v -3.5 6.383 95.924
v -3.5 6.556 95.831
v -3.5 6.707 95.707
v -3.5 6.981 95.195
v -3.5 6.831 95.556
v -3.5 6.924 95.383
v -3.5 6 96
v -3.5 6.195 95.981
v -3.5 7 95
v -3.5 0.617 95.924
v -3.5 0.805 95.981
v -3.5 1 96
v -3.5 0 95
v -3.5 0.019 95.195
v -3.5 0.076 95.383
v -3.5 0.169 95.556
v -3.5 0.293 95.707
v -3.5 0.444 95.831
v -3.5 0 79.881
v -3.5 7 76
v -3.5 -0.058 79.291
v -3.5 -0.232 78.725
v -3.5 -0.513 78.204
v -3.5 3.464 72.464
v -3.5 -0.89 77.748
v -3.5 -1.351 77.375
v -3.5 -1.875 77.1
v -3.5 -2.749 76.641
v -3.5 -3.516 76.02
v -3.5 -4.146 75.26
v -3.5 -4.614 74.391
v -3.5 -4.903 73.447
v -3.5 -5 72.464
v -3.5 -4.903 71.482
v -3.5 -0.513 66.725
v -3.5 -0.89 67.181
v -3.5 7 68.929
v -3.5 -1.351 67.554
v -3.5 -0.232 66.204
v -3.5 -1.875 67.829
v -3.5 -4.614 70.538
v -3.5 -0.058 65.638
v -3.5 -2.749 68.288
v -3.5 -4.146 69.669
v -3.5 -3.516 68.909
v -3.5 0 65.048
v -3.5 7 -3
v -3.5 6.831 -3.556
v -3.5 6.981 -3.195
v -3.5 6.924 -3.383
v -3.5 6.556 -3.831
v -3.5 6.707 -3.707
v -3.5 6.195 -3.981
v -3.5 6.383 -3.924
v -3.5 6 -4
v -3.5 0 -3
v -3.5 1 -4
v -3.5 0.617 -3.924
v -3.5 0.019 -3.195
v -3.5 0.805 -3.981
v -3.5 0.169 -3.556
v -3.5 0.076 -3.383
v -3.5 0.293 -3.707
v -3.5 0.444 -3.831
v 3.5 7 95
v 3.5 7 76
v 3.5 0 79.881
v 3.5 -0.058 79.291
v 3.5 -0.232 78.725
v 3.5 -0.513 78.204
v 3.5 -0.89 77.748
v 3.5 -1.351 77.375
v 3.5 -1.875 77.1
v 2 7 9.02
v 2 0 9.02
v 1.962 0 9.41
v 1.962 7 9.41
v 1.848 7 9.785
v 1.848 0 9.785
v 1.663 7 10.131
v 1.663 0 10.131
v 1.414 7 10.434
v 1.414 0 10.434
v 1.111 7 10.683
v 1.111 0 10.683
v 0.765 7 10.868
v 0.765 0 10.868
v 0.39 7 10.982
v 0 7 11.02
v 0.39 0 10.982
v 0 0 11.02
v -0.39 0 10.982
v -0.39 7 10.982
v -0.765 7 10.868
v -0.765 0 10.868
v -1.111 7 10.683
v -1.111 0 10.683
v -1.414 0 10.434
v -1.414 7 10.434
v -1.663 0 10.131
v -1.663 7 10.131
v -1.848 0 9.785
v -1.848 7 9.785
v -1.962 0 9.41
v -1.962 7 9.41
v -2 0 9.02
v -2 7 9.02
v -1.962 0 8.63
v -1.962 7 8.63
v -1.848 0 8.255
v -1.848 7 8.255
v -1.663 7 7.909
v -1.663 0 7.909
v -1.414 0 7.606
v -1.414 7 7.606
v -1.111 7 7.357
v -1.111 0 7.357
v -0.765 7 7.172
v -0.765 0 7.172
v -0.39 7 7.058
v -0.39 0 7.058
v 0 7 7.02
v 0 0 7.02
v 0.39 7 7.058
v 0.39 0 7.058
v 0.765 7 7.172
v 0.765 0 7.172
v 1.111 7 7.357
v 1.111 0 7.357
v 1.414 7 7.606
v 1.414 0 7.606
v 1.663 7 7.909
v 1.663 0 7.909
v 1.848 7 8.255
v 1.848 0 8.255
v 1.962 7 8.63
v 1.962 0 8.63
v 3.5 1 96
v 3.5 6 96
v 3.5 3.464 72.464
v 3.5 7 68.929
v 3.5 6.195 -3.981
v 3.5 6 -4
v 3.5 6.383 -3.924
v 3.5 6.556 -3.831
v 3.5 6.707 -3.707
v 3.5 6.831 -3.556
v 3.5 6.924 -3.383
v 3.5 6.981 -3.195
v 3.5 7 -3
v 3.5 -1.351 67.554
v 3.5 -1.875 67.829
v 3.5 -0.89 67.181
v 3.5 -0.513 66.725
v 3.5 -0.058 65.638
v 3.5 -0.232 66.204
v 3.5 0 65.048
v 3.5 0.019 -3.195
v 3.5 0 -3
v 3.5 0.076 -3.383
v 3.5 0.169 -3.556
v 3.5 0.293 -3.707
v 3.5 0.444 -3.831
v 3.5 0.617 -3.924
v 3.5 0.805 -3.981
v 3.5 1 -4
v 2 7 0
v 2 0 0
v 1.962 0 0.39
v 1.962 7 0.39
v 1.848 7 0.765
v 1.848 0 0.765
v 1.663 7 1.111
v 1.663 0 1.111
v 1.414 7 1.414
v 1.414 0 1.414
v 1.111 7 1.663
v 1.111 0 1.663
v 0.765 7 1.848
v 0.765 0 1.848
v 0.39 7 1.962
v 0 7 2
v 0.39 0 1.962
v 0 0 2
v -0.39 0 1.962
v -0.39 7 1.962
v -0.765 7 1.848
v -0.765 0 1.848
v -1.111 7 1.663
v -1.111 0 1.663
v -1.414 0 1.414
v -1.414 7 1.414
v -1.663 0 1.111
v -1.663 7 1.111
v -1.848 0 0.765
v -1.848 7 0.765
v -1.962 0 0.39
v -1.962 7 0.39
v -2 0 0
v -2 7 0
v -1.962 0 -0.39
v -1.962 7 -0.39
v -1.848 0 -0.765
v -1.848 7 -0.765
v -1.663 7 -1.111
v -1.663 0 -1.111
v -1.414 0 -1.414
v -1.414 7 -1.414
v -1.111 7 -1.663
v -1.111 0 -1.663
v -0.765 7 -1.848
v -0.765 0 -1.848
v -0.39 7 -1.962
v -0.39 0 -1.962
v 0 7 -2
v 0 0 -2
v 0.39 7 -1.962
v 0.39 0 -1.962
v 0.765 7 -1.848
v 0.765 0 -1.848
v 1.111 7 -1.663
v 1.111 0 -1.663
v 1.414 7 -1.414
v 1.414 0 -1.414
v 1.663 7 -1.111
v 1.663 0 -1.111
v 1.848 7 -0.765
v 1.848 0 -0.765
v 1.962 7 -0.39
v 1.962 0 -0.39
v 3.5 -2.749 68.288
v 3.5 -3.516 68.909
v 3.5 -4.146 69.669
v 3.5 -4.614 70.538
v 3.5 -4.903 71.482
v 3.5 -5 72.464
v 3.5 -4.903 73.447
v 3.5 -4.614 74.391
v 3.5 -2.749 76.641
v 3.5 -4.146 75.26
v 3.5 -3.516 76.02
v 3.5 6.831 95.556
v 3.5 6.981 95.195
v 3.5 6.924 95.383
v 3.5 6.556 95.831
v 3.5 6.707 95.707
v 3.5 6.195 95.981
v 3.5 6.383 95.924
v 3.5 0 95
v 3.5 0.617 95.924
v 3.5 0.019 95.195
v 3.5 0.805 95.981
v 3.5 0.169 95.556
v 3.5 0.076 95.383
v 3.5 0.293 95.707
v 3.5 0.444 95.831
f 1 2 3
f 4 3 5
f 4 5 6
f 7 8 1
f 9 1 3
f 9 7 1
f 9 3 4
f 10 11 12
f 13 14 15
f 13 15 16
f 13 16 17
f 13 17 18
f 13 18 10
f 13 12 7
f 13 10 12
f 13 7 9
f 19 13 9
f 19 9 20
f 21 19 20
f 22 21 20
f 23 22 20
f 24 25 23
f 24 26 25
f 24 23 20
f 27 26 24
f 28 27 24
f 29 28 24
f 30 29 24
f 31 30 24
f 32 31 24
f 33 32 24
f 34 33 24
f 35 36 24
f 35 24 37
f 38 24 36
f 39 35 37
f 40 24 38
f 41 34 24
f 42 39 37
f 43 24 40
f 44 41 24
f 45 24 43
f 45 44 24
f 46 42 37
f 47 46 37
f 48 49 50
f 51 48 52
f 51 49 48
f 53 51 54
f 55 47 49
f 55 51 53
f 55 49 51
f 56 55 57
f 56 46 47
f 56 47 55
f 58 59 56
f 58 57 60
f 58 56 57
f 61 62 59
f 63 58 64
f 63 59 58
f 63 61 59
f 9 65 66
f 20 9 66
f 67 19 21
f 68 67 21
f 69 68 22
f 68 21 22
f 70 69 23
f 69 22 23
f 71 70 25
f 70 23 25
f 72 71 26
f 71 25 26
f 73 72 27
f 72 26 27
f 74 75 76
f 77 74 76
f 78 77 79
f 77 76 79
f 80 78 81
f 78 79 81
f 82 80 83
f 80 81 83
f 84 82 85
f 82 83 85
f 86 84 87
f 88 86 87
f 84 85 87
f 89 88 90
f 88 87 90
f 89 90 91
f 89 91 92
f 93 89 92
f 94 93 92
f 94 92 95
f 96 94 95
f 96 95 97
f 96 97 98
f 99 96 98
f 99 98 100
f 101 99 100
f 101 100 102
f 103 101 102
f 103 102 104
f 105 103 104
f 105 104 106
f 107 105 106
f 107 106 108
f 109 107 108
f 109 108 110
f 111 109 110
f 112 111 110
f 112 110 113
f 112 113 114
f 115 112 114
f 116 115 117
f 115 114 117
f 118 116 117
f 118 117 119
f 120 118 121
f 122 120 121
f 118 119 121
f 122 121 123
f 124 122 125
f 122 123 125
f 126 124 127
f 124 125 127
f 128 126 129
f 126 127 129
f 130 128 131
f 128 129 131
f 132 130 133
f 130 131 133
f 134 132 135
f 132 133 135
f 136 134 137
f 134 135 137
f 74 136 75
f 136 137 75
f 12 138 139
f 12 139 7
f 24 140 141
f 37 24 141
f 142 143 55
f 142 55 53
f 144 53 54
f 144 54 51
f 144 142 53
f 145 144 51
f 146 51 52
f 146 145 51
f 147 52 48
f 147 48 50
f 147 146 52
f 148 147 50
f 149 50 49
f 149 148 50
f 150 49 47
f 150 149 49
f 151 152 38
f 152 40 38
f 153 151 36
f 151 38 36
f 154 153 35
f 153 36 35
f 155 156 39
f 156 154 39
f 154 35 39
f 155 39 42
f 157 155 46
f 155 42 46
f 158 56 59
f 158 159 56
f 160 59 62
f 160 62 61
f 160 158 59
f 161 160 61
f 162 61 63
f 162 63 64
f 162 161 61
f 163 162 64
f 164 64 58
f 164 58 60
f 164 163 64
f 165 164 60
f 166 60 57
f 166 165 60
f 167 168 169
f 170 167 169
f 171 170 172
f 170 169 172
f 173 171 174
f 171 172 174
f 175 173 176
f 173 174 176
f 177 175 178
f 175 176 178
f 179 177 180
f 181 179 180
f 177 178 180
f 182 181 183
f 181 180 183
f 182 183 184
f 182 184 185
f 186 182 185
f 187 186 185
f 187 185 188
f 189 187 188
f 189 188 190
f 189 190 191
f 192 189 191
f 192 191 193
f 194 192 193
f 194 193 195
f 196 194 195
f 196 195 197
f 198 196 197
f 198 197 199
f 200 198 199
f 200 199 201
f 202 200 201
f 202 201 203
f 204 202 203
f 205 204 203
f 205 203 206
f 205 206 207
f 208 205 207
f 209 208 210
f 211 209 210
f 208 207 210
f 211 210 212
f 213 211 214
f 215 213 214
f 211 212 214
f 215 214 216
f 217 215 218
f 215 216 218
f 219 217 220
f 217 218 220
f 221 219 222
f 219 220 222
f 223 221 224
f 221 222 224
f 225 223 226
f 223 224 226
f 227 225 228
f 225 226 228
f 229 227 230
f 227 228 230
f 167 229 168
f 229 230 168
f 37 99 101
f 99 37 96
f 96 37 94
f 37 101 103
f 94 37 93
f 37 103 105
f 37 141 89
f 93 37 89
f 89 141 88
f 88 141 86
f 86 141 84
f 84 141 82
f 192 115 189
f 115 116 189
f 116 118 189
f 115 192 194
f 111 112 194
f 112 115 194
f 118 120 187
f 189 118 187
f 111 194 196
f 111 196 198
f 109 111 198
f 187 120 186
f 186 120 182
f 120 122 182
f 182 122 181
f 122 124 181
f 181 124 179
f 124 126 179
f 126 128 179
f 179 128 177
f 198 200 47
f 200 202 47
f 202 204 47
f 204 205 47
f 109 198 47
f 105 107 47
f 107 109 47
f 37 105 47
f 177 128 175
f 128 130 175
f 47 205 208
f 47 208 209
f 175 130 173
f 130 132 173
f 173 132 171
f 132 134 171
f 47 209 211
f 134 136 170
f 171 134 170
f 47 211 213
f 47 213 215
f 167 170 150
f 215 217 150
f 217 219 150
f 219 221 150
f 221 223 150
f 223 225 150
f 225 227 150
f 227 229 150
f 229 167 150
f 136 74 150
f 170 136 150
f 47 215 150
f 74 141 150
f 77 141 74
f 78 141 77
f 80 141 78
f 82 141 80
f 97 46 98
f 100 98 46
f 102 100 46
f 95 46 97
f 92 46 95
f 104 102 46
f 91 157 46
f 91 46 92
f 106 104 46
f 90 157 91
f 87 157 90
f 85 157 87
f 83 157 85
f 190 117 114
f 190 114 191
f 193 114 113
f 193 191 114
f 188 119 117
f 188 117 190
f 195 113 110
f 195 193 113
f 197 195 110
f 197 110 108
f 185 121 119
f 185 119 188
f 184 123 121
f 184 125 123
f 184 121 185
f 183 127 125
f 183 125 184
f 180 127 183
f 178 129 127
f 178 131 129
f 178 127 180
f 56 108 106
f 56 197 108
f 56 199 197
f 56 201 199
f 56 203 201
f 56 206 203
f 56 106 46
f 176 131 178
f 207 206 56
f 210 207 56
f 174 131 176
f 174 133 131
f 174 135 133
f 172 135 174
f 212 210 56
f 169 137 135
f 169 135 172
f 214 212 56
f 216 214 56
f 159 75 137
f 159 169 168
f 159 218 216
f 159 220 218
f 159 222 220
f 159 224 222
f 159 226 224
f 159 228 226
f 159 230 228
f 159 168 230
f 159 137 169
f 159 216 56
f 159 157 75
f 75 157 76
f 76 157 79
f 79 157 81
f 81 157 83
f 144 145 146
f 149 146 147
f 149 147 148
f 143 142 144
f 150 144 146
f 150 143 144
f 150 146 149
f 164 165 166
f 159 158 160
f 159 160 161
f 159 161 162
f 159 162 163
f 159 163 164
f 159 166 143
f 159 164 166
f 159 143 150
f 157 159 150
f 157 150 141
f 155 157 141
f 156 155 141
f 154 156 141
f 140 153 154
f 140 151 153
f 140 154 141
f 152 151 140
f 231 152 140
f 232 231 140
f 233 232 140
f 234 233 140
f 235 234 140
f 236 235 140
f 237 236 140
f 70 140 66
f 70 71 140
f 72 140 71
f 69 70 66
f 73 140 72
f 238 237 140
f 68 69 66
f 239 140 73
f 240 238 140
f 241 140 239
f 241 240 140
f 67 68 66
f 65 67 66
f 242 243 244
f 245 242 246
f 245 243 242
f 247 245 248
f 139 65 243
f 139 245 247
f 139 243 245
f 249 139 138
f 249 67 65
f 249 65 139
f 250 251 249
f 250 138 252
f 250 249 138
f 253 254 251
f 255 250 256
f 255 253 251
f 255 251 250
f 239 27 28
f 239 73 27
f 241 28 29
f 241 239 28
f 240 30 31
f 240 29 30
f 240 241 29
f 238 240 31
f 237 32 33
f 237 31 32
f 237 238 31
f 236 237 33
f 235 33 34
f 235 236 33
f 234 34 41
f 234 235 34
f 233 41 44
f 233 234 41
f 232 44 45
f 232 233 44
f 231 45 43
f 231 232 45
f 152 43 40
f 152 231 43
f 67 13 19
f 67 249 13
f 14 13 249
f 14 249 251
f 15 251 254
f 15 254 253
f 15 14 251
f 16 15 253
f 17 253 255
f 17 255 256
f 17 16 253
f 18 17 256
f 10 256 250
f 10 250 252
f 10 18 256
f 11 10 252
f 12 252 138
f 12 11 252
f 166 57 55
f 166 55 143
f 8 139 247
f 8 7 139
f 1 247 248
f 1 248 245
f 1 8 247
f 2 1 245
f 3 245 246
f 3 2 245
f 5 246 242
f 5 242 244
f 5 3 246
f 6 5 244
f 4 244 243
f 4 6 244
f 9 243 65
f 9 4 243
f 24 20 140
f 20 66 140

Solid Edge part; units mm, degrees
sketch "Sketch1" plane through (0, 0, 0) normal (0, -1, 0) x (1, 0, 0)
  circle A0 centre (0, 0) radius 2
  circle A1 centre (0, 9.02) radius 2
  line L0 (3.5, -4) -> (3.5, 96)
  line L1 (3.5, 96) -> (-3.5, 96)
  line L2 (-3.5, 96) -> (-3.5, -4)
  line L3 (-3.5, -4) -> (3.5, -4)
extrude "Protrusion1" add sketch "Sketch1" against normal blind 7
sketch "Sketch2" plane through (3.5, 3.5, 46) normal (1, 0, 0) x (0, 0, -1)
  line L0 (-30, 3.5) -> (-26.4645, -0.0355)
  line L1 (-26.4645, -0.0355) -> (-22.9289, 3.5)
  line L2 (-22.9289, 3.5) -> (-30, 3.5)
extrude "ExtrudedCutout_1" cut sketch "Sketch2" against normal blind 24
sketch "Sketch3" plane through (3.5, 3.5, 46) normal (1, 0, 0) x (0, 0, -1)
  line L0 (-31.4645, -3.5) -> (-21.4645, -3.5)
  arc A0 (-21.4645, -3.5) -> (-31.4645, -3.5) centre (-26.4645, -3.5) cw
extrude "ExtrudedProtrusion_2" add sketch "Sketch3" against normal blind 7
fillet "Round_1" radius 3 2 edges at (0, 0, 67.4645) (0, 0, 77.4645)
fillet "Round_2" radius 1 4 edges at (0, 7, 96) (0, 0, 96) (0, 0, -4) (0, 7, -4)
